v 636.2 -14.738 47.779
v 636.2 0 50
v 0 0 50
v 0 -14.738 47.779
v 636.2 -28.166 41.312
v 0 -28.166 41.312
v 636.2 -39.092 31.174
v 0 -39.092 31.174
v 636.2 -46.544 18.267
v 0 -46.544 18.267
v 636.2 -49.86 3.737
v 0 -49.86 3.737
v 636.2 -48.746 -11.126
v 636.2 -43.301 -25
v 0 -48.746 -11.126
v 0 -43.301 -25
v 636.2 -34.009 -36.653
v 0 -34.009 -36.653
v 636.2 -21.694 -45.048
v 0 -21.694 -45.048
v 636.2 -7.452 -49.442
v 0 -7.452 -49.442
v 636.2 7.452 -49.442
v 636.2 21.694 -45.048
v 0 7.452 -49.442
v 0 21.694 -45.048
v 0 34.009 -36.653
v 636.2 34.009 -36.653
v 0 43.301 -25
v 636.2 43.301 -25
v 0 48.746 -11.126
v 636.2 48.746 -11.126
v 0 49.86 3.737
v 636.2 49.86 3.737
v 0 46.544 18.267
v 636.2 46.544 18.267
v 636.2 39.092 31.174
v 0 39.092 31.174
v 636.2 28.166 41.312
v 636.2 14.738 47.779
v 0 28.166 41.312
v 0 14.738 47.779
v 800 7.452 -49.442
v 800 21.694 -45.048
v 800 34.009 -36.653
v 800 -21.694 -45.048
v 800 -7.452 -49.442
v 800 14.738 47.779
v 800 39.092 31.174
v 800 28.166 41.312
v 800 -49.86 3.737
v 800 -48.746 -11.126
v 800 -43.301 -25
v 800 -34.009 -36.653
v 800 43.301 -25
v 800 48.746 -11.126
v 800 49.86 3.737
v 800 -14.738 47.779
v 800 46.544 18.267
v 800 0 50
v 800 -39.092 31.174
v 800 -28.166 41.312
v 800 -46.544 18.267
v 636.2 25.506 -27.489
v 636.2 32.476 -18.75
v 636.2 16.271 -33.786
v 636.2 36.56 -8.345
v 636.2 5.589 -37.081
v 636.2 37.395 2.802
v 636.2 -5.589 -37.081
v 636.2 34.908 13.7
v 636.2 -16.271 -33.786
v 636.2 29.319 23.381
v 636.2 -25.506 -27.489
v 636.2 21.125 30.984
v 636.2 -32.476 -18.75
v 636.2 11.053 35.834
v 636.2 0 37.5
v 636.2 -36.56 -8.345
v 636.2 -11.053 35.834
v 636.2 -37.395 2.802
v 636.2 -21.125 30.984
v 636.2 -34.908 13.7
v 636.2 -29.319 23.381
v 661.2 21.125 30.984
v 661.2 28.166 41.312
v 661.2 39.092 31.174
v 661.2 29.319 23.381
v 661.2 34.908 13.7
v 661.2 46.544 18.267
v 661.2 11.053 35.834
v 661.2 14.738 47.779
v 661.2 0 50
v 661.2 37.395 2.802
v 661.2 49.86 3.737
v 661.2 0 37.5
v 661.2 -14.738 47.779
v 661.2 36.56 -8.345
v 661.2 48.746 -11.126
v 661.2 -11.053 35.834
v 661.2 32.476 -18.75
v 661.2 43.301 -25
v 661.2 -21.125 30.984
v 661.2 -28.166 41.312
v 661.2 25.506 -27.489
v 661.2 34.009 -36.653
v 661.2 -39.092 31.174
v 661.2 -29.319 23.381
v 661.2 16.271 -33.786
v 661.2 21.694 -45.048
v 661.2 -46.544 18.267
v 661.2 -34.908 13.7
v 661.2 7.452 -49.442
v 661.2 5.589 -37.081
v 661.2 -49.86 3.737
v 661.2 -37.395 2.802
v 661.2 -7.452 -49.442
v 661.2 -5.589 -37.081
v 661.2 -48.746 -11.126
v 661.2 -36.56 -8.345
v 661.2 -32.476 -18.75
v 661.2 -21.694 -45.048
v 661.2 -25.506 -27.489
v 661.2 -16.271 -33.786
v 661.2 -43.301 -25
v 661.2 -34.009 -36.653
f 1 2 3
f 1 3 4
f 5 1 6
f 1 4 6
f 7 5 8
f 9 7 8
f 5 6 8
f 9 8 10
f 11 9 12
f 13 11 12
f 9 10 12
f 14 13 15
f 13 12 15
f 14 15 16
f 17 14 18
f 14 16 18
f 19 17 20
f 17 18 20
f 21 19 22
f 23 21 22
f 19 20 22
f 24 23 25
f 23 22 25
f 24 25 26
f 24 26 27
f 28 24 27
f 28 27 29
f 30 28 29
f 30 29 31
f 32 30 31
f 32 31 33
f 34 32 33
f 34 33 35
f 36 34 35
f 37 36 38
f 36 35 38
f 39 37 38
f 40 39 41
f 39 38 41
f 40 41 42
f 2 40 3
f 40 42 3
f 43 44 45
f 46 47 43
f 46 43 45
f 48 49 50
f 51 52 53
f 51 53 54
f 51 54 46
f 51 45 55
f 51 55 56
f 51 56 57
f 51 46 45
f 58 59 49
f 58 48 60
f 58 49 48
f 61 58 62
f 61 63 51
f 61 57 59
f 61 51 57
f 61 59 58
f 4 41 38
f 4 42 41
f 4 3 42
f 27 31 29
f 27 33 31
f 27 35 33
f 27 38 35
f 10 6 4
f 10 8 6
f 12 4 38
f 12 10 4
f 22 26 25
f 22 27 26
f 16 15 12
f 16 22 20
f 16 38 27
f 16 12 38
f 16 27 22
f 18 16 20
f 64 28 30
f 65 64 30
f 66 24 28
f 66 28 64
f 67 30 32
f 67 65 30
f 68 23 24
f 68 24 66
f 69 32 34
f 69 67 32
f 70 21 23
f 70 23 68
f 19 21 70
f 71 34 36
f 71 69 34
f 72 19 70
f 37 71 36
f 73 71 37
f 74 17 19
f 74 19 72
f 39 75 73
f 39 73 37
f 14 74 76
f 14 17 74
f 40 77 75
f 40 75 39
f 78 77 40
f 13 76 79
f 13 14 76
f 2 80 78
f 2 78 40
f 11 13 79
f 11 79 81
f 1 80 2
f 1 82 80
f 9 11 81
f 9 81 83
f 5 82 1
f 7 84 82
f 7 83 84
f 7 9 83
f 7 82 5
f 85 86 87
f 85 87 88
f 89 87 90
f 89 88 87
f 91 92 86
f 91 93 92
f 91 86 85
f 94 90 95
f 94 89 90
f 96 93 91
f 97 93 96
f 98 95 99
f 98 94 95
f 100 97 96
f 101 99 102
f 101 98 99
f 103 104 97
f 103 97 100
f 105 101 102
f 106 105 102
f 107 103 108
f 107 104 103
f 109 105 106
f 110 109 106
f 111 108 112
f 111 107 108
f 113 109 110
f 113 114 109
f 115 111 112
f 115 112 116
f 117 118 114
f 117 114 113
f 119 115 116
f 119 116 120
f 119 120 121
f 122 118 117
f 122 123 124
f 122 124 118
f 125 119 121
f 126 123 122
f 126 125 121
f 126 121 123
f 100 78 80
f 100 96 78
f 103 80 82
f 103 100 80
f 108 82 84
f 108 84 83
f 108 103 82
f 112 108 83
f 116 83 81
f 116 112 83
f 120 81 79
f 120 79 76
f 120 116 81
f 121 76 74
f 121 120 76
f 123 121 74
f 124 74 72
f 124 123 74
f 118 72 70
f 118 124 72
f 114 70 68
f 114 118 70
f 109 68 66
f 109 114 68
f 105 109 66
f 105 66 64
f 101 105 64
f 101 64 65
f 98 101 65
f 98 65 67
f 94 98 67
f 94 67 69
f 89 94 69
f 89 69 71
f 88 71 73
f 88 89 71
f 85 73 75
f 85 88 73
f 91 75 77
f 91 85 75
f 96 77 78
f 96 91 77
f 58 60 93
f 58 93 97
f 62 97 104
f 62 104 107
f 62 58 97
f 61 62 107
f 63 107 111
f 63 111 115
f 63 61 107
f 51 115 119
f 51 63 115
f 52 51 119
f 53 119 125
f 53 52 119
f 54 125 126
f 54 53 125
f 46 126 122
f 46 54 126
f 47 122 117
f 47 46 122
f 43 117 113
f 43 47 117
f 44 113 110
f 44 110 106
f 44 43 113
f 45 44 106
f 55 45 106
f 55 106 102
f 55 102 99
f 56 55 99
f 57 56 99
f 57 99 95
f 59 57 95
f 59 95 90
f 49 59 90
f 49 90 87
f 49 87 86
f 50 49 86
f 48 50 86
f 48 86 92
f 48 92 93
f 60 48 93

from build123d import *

# Parameters (mm, degrees)
BOSS_EXTRUDE1_START = 100
SKETCH4_R           = 50
BOSS_EXTRUDE1_DEPTH = 100


with BuildPart() as part:
    # Sketch3 → Revolve1 (revolve)
    with BuildSketch(Plane.XY, mode=Mode.PRIVATE) as revolve1_sk:
        Polygon((0, 0), (0, 50), (2.676183962, 50), (636.2, 50), (636.2, 37.5), (661.2, 37.5), (661.2, 50), (700, 50), (700, 0), align=None)
    revolve(revolve1_sk.sketch.rotate(Axis((0, 0, 0), (1, 0, 0)), 90), axis=Axis((0, 0, 0), (1, 0, 0)))

    # Sketch4 → Boss-Extrude1 (add)
    with BuildSketch(Plane(origin=(700, 0, 0), x_dir=(0, 0, -1), z_dir=(1, 0, 0)).offset(BOSS_EXTRUDE1_START)):
        with Locations(Location((0, 0, 0), (0, 0, 180))):
            Circle(SKETCH4_R)
    extrude(amount=-BOSS_EXTRUDE1_DEPTH)


solid = part.part
